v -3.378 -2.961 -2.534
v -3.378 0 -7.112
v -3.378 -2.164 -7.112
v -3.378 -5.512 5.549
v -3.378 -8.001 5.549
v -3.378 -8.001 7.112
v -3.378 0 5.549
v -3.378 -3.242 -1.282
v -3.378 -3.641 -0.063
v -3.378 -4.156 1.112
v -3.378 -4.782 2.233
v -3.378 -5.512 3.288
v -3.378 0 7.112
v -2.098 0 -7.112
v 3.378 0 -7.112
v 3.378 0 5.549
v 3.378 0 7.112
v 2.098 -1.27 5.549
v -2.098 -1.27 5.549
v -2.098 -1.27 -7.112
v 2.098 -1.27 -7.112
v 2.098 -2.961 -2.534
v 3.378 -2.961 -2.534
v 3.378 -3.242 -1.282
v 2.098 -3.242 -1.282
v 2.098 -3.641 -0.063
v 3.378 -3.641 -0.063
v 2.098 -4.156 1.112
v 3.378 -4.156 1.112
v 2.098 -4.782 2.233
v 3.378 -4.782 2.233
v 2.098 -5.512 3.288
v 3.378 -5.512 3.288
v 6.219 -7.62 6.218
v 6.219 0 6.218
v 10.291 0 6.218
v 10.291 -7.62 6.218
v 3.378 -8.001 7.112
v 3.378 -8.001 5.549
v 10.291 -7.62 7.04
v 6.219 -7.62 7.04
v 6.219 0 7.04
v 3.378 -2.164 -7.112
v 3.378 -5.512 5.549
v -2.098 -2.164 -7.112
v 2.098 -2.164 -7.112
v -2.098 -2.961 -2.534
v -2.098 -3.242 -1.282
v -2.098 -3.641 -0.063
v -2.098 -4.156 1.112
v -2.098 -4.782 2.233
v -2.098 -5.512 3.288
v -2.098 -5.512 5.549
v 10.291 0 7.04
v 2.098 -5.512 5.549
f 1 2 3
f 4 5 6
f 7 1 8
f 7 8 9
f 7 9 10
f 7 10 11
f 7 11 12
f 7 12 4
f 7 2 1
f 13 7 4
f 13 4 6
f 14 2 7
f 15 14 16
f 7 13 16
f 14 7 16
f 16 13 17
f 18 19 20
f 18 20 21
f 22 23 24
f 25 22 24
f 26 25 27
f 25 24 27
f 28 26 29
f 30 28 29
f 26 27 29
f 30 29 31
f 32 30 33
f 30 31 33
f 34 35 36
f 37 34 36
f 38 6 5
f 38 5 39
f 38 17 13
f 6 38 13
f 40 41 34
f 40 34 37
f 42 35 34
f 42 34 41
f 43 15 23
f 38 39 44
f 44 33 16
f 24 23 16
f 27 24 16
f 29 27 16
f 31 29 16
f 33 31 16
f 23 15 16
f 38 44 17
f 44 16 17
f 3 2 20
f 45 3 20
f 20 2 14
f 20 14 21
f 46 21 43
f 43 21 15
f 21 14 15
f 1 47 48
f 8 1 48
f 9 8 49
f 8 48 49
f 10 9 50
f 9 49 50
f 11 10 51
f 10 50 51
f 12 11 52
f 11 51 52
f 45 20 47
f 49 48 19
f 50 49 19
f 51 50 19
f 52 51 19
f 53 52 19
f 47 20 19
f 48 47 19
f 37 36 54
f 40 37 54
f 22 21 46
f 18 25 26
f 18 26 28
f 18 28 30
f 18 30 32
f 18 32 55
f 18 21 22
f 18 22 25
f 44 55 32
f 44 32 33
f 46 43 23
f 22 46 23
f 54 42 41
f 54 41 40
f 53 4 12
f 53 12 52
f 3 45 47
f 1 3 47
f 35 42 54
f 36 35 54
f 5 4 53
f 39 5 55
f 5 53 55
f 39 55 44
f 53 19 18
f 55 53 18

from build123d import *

# Parameters (mm, degrees)
F1_DEPTH = 8.001
F0_W     = 1.2806631903
F0_H     = 12.6610611121
F2_DEPTH = 5.5118
F3_DEPTH = 1.27
F5_DEPTH = 25.4
F6_W     = 4.0718228556
F6_H     = 0.8211005479
F7_DEPTH = 7.62


with BuildPart() as f1:
    # F0 (on Front) → F1 (new body)
    with BuildSketch(Plane.XZ):
        Polygon((3.3782, 7.112), (-3.3782, 7.112), (-3.3782, 5.5490611121), (-2.0975368097, 5.5490611121), (2.0975368097, 5.5490611121), (3.3782, 5.5490611121), align=None)
    extrude(amount=F1_DEPTH)

    # F0 (on Front) → F2 (join)
    with BuildSketch(Plane.XZ):
        with Locations((-2.7378684049, -0.7814694439)):
            Rectangle(F0_W, F0_H)
        with Locations((2.7378684049, -0.7814694439)):
            Rectangle(F0_W, F0_H)
    extrude(amount=F2_DEPTH)

    # F0 (on Front) → F3 (join)
    with BuildSketch(Plane.XZ):
        Polygon((2.0975368097, 5.5490611121), (-2.0975368097, 5.5490611121), (-2.0975368097, -7.112), (0, -7.112), (2.0975368097, -7.112), align=None)
    extrude(amount=F3_DEPTH)

    # F4 (on face) → F5 (cut)
    with BuildSketch(Plane.YZ.offset(3.3782)):
        with BuildLine():
            Line((-5.5118, -7.112), (-2.1635754965, -7.112))
            Line((-2.1635754965, -7.112), (-2.9609058984, -2.5340106804))
            ThreePointArc((-2.9609058984, -2.5340106804), (-3.8845736468, 0.5309912225), (-5.5118, 3.287716303))
            Line((-5.5118, 3.287716303), (-5.5118, -7.112))
        make_face()
    extrude(amount=-F5_DEPTH, mode=Mode.SUBTRACT)


with BuildPart() as f7:
    # F6 (on Front) → F7 (new body)
    with BuildSketch(Plane.XZ):
        with Locations((8.2553818356, 6.6290106624)):
            Rectangle(F6_W, F6_H)
    extrude(amount=F7_DEPTH)


solid = Compound([f1.part, f7.part])
